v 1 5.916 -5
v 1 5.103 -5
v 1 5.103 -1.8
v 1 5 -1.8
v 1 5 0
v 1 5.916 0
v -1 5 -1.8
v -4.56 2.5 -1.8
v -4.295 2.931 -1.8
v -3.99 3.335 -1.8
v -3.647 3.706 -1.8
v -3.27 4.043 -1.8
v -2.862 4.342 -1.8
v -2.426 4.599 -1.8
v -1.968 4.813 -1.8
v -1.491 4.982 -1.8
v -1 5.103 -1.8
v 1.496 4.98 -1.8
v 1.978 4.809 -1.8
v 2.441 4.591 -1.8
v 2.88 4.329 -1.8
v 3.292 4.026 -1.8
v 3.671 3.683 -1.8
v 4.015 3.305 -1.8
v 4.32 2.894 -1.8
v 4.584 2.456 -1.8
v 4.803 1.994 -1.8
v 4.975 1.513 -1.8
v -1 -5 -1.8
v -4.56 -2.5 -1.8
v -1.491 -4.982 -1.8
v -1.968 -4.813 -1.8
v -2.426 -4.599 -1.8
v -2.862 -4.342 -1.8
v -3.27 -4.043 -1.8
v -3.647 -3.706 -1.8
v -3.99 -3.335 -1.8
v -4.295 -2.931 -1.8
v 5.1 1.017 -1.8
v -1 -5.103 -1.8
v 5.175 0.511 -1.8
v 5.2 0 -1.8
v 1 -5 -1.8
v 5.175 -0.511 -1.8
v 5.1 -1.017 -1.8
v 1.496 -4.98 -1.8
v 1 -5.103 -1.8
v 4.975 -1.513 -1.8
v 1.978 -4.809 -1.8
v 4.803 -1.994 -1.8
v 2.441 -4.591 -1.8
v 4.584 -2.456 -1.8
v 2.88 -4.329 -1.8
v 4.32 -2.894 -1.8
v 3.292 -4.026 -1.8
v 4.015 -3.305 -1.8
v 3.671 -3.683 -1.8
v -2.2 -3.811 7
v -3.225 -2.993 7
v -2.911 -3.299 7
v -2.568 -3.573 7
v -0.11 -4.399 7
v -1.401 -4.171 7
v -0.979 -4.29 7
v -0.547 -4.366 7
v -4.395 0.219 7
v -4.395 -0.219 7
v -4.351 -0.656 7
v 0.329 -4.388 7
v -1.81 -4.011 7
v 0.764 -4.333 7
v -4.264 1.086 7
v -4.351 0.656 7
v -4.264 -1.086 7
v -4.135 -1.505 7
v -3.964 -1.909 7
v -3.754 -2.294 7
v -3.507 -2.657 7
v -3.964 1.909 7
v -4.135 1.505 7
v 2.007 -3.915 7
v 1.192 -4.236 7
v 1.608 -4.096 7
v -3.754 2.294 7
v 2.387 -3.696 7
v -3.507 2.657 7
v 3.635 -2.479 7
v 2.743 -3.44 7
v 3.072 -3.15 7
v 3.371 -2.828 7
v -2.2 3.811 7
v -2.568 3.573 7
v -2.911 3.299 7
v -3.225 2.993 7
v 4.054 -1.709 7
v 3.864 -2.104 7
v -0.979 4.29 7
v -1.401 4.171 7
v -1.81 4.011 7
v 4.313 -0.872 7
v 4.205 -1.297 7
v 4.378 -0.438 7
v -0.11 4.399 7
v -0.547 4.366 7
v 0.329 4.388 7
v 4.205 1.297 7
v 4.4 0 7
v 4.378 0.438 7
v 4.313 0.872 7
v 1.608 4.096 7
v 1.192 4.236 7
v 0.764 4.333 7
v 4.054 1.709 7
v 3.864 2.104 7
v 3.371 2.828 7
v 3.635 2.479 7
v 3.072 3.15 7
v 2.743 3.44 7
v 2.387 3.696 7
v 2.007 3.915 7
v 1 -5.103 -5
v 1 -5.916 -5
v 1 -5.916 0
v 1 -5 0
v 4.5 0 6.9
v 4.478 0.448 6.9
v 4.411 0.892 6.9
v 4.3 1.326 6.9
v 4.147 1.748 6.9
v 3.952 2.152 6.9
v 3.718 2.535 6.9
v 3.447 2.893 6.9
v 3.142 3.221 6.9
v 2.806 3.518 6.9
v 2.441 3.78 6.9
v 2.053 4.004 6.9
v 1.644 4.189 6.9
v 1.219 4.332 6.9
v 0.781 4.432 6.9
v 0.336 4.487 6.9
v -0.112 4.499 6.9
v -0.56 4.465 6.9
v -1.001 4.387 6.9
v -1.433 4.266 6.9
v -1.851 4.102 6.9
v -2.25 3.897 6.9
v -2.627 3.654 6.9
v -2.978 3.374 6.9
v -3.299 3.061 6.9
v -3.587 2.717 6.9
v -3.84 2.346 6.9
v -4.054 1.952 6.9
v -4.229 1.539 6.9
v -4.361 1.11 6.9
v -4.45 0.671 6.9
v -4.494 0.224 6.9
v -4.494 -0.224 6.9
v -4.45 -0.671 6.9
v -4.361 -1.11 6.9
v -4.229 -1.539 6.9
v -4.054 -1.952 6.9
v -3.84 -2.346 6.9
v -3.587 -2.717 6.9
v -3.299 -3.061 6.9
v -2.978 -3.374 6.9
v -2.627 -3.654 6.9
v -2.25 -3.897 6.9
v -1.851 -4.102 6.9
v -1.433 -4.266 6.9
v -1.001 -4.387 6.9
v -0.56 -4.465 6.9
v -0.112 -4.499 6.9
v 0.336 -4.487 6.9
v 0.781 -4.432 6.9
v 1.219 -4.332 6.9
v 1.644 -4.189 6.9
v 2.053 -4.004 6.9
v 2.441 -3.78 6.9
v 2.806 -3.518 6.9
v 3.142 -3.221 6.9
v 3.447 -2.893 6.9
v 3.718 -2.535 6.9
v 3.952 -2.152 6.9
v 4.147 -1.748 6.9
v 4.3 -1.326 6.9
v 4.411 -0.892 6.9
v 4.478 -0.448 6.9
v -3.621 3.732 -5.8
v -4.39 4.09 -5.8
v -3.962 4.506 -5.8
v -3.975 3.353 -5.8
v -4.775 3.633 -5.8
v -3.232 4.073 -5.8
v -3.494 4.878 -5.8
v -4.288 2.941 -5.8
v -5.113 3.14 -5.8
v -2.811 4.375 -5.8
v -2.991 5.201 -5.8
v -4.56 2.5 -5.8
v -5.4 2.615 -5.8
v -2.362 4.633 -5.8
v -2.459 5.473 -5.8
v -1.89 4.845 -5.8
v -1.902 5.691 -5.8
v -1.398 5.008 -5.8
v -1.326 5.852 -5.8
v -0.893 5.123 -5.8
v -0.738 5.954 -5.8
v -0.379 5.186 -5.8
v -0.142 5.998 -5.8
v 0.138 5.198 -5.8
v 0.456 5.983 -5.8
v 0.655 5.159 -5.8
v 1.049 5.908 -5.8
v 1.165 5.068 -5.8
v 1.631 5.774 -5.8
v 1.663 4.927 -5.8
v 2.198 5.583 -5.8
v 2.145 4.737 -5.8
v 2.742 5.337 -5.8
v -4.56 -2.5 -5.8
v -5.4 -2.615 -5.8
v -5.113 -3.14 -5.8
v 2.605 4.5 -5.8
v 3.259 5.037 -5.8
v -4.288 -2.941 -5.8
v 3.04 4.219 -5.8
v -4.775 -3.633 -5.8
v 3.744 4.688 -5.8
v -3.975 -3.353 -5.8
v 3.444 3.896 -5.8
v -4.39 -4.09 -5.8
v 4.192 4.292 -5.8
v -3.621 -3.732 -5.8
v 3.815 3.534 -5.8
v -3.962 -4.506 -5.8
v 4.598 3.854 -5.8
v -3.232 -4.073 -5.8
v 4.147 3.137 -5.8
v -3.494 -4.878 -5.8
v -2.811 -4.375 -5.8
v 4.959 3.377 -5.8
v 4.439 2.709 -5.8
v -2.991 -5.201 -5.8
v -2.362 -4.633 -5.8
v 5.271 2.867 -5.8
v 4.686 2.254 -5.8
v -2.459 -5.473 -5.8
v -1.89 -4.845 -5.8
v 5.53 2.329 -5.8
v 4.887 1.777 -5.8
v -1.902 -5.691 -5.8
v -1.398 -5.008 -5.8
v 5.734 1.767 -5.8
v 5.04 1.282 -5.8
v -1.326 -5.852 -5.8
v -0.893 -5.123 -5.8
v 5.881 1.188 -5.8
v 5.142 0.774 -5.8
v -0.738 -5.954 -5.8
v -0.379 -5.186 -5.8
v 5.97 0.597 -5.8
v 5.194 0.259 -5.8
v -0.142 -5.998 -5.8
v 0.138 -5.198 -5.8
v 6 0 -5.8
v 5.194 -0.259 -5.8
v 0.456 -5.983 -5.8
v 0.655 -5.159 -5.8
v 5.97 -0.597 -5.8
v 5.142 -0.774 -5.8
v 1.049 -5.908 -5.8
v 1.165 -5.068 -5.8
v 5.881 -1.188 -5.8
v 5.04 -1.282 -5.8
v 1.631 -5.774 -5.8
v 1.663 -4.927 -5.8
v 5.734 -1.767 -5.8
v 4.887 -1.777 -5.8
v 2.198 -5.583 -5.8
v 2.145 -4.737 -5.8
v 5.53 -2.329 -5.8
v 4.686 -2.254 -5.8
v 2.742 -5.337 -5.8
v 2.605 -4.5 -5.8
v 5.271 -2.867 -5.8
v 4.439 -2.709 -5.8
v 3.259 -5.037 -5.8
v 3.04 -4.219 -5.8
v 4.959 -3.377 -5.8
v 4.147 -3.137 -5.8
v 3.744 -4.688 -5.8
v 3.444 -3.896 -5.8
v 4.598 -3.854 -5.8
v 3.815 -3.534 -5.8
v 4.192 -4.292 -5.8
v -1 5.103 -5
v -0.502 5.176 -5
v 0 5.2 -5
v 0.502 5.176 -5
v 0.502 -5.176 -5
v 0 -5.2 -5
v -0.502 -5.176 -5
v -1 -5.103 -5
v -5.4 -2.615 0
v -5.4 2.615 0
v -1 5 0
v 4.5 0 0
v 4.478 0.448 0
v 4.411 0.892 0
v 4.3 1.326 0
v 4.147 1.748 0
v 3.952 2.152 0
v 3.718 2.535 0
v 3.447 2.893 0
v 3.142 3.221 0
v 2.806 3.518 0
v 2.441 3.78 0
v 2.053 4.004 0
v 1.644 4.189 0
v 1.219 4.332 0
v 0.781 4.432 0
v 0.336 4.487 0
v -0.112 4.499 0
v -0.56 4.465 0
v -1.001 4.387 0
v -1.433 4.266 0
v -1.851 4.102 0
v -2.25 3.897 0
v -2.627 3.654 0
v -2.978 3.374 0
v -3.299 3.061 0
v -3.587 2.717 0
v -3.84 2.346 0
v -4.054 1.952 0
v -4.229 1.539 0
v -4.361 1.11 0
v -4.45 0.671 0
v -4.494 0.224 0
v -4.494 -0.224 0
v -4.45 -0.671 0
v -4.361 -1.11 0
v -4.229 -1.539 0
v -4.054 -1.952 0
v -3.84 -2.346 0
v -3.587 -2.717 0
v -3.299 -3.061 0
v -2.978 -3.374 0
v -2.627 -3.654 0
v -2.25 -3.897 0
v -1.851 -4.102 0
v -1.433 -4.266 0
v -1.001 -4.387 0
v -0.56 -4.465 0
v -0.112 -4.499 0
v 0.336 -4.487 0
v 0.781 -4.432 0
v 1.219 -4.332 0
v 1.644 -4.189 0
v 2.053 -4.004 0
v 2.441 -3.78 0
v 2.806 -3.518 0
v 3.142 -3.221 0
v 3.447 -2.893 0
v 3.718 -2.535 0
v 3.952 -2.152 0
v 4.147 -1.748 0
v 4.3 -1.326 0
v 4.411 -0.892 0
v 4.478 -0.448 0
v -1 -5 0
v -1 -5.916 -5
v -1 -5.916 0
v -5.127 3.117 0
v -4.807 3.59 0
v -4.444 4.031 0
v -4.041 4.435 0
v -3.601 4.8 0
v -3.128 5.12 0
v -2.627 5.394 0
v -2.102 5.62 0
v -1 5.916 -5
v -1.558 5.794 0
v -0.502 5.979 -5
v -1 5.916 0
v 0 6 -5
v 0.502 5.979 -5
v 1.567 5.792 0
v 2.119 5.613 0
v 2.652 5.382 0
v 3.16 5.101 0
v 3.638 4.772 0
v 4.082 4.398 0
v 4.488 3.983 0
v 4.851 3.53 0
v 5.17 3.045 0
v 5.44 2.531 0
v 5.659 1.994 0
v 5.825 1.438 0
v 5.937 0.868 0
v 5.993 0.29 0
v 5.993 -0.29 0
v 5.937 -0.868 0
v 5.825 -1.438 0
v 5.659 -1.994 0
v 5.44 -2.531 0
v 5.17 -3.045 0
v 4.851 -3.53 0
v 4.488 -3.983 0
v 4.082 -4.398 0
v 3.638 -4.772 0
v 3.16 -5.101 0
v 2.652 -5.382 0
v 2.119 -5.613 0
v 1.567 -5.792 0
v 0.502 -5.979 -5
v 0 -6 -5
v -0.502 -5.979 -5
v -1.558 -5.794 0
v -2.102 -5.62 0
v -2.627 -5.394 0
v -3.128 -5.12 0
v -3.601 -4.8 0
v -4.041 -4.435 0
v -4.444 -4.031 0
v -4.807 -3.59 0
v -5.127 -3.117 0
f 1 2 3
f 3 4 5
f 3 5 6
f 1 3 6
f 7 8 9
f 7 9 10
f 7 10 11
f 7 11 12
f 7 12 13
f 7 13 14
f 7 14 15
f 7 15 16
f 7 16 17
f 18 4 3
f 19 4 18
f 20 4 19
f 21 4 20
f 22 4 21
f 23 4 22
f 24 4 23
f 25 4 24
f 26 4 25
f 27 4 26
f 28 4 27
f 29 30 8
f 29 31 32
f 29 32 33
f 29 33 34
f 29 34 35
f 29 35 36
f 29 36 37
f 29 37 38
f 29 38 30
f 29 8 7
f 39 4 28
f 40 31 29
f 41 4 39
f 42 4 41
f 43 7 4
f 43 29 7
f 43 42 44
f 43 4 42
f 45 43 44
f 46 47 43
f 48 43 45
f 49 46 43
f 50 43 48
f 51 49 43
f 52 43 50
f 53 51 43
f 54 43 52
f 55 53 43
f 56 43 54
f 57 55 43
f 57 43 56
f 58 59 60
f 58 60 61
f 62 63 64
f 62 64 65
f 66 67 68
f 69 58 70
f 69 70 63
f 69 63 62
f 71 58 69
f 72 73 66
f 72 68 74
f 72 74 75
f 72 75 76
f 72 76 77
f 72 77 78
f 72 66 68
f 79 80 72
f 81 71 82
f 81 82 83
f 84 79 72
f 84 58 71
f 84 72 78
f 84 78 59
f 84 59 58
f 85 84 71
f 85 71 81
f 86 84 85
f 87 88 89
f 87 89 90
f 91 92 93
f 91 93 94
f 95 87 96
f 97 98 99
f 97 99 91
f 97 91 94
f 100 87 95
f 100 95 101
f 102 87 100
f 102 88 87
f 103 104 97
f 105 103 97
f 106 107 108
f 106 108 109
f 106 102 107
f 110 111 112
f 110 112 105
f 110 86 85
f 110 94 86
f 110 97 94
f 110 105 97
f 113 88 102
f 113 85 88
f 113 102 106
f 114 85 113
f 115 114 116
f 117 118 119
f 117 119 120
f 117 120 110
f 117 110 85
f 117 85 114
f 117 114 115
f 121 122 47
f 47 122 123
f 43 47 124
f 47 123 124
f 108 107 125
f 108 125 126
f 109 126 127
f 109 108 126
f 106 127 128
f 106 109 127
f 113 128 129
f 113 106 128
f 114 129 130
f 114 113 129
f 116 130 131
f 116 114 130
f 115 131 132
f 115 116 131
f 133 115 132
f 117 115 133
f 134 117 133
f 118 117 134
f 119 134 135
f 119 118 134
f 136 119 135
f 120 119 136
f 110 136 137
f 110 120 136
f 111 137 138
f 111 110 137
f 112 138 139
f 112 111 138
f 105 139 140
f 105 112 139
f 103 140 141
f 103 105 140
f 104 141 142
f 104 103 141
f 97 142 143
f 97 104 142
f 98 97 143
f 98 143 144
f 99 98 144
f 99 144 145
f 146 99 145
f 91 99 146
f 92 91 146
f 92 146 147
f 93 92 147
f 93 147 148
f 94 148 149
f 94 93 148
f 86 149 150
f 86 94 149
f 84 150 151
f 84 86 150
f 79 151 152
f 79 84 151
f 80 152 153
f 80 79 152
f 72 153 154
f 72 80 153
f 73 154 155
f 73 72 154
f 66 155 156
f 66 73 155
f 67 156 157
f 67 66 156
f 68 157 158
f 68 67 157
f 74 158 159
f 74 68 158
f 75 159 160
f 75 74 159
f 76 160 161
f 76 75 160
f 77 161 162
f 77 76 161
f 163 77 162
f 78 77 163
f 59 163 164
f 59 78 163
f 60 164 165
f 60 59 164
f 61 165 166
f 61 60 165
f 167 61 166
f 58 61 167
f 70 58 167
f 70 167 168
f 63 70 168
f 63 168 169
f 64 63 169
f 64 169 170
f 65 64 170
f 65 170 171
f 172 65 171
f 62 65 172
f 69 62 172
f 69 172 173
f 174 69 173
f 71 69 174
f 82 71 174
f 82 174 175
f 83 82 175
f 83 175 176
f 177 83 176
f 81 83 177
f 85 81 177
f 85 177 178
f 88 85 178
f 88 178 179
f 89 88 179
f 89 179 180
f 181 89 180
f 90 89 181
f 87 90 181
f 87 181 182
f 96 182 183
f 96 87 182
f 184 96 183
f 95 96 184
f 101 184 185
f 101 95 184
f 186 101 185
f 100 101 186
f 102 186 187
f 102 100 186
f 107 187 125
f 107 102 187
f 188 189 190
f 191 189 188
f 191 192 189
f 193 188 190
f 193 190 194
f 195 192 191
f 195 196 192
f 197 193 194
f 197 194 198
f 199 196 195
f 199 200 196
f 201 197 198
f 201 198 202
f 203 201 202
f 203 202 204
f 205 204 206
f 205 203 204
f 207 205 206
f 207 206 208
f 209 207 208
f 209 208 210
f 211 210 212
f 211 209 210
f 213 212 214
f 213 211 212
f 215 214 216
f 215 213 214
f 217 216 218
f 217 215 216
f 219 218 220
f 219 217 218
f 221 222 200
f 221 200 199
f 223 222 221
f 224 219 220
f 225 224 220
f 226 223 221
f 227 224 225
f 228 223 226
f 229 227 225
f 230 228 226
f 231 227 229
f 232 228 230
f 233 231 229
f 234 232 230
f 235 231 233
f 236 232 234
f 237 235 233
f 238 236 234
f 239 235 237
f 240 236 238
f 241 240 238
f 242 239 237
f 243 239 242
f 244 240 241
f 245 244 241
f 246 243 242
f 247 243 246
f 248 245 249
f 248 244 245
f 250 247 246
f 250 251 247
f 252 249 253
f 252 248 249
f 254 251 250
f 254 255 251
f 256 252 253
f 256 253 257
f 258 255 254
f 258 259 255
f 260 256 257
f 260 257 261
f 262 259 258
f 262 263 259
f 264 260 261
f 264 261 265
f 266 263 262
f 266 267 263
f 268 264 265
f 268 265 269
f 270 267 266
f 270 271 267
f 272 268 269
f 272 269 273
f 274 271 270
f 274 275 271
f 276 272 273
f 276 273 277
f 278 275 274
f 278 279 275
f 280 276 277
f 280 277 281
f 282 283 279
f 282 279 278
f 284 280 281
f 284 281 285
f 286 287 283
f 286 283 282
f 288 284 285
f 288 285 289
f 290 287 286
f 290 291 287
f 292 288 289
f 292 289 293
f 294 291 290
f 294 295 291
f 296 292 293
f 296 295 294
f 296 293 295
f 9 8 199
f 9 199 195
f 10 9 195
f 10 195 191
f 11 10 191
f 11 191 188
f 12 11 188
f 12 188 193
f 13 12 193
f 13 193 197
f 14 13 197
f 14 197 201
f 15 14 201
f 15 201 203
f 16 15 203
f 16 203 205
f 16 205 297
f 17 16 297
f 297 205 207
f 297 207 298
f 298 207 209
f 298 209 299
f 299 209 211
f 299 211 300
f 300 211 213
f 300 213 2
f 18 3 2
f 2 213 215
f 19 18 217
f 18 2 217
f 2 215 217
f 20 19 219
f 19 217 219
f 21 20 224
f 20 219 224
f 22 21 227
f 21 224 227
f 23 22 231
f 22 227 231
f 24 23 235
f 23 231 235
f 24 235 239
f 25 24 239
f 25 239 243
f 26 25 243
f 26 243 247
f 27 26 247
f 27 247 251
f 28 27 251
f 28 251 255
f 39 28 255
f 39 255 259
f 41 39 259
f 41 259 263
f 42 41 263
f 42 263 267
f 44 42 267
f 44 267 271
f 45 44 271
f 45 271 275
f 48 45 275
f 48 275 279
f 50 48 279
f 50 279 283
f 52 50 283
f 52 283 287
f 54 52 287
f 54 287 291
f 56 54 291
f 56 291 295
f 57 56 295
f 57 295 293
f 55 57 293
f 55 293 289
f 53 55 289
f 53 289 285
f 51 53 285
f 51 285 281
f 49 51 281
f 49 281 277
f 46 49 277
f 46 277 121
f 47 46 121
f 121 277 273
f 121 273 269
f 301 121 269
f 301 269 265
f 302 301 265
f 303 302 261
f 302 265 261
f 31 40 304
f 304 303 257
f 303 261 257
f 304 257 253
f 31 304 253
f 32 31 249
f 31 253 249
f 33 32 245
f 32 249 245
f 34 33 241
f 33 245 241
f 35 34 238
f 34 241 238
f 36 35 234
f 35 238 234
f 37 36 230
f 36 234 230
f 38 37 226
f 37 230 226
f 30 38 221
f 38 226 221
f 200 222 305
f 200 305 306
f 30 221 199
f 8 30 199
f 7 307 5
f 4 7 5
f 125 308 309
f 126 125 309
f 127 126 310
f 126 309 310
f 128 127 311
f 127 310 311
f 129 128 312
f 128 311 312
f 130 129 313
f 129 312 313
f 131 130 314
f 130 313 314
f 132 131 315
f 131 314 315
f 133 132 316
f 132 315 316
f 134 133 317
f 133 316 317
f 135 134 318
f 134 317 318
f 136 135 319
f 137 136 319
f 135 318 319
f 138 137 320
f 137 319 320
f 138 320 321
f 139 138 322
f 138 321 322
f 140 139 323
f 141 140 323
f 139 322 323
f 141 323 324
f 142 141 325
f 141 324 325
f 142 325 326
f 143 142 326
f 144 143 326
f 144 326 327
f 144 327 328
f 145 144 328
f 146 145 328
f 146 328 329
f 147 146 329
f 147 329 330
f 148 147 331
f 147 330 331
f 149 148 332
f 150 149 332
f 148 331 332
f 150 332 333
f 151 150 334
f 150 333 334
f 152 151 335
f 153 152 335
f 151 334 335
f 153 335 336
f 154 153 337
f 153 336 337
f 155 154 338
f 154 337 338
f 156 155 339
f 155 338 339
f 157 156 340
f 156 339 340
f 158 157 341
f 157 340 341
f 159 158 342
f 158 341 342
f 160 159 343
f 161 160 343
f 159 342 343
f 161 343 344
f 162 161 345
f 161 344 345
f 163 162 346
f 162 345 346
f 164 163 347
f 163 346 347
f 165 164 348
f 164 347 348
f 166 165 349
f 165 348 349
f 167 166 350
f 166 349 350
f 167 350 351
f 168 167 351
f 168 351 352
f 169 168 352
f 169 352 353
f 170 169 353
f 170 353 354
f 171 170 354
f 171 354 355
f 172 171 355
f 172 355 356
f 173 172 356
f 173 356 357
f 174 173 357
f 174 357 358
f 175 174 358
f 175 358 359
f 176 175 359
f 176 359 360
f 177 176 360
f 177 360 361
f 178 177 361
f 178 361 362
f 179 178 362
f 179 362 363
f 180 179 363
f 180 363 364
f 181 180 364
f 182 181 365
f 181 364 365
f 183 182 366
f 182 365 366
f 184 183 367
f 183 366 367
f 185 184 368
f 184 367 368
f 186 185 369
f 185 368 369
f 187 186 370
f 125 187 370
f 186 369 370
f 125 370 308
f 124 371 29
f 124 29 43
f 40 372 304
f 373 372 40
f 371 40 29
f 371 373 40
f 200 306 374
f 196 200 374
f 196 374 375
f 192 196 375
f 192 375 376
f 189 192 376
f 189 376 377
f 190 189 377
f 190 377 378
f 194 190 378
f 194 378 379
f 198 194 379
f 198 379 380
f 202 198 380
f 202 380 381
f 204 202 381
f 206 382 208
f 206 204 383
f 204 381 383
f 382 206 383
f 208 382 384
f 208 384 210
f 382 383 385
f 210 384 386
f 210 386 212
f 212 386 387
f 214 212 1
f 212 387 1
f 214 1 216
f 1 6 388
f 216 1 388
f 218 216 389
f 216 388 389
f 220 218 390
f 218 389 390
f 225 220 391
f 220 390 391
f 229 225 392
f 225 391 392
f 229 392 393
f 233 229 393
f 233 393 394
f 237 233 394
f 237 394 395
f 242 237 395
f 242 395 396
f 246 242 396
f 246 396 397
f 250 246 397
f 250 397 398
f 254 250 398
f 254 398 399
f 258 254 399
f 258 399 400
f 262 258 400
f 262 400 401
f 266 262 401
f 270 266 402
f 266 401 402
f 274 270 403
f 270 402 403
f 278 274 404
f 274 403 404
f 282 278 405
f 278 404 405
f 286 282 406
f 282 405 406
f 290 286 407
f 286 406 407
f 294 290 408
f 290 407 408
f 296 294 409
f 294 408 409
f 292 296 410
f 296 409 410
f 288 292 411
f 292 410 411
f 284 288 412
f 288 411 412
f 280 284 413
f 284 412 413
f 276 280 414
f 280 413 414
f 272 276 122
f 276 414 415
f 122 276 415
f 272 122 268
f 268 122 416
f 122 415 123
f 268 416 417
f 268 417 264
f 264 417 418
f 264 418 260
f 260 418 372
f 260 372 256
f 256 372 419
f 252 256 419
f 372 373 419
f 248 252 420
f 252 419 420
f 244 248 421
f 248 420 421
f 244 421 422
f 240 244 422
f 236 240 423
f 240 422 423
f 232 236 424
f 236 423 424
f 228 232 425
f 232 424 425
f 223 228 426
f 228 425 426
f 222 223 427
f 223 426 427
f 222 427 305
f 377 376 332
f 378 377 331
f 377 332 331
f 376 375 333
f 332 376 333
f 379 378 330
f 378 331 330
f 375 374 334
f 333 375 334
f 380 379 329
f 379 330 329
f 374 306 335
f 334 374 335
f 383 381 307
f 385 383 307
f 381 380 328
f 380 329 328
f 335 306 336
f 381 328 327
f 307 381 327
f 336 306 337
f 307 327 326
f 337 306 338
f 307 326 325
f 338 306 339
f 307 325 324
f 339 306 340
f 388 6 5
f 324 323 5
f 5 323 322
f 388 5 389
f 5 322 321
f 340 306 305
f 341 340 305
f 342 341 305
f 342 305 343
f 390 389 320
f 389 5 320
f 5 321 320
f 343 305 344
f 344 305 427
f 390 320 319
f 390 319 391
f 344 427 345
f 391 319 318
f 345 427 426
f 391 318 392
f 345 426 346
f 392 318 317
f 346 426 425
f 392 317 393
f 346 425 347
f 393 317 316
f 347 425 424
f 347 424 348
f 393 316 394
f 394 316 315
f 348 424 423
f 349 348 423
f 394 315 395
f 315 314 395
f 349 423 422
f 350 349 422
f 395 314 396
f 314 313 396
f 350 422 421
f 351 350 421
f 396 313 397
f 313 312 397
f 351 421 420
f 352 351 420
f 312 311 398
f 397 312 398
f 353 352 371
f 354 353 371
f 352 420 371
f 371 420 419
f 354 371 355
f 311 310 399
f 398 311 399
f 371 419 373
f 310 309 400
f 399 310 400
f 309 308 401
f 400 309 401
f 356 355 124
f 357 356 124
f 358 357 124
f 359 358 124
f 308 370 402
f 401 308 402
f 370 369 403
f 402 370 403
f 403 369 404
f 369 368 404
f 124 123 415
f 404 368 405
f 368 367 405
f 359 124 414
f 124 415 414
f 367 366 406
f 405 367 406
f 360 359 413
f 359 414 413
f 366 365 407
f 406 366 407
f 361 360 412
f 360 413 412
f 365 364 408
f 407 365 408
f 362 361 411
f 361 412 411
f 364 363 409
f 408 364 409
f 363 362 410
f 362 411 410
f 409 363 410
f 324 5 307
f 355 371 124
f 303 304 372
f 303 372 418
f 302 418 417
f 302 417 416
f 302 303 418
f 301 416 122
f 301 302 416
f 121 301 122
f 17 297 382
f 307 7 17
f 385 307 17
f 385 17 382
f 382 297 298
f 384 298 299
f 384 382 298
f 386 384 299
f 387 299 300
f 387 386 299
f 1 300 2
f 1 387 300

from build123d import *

# Parameters (mm, degrees)
SKETCH_R        = 4.5
PAD_DEPTH       = 7
SKETCH001_R     = 6
PAD001_DEPTH    = 5.8
SKETCH002_W     = 2
SKETCH002_H     = 10
POCKET_DEPTH    = 7
CHAMFER_SIZE    = 0.1
SKETCH003_W     = 2
SKETCH003_H     = 2
POCKET001_DEPTH = 5
POCKET002_DEPTH = 4


with BuildPart() as part:
    # Sketch → Pad (new body)
    with BuildSketch(Plane.XY):
        Circle(SKETCH_R)
    extrude(amount=PAD_DEPTH)

    # Sketch001 (on Face2 of Pad) → Pad001 (join)
    with BuildSketch(Plane(origin=(0, 0, 0), x_dir=(1, 0, 0), z_dir=(0, 0, -1))):
        Circle(SKETCH001_R)
    extrude(amount=PAD001_DEPTH)

    # Sketch002 (on Face2 of Pad001) → Pocket (cut)
    with BuildSketch(Plane.XY):
        with Locations((-6.4, 0)):
            Rectangle(SKETCH002_W, SKETCH002_H)
    extrude(amount=-POCKET_DEPTH, mode=Mode.SUBTRACT)

    # Chamfer
    chamfer_edges = [part.edges().sort_by_distance(p)[0] for p in [
        (-4.5, 0, 7),
    ]]
    chamfer(chamfer_edges, length=CHAMFER_SIZE)

    # Sketch003 (on Face3 of Chamfer) → Pocket001 (cut)
    with BuildSketch(Plane.XY):
        with Locations((0, 6)):
            Rectangle(SKETCH003_W, SKETCH003_H)
        with Locations((0, -6)):
            Rectangle(SKETCH003_W, SKETCH003_H)
    extrude(amount=-POCKET001_DEPTH, mode=Mode.SUBTRACT)

    # Sketch004 (on Face14 of Pocket001) → Pocket002 (cut)
    with BuildSketch(Plane(origin=(0, 0, -5.8), x_dir=(1, 0, 0), z_dir=(0, 0, -1))):
        with BuildLine():
            ThreePointArc((-4.559605, -2.5), (5.2, 0), (-4.559605, 2.5))
            Line((-4.559605, 2.5), (-4.559605, -2.5))
        make_face()
    extrude(amount=-POCKET002_DEPTH, mode=Mode.SUBTRACT)


solid = part.part
